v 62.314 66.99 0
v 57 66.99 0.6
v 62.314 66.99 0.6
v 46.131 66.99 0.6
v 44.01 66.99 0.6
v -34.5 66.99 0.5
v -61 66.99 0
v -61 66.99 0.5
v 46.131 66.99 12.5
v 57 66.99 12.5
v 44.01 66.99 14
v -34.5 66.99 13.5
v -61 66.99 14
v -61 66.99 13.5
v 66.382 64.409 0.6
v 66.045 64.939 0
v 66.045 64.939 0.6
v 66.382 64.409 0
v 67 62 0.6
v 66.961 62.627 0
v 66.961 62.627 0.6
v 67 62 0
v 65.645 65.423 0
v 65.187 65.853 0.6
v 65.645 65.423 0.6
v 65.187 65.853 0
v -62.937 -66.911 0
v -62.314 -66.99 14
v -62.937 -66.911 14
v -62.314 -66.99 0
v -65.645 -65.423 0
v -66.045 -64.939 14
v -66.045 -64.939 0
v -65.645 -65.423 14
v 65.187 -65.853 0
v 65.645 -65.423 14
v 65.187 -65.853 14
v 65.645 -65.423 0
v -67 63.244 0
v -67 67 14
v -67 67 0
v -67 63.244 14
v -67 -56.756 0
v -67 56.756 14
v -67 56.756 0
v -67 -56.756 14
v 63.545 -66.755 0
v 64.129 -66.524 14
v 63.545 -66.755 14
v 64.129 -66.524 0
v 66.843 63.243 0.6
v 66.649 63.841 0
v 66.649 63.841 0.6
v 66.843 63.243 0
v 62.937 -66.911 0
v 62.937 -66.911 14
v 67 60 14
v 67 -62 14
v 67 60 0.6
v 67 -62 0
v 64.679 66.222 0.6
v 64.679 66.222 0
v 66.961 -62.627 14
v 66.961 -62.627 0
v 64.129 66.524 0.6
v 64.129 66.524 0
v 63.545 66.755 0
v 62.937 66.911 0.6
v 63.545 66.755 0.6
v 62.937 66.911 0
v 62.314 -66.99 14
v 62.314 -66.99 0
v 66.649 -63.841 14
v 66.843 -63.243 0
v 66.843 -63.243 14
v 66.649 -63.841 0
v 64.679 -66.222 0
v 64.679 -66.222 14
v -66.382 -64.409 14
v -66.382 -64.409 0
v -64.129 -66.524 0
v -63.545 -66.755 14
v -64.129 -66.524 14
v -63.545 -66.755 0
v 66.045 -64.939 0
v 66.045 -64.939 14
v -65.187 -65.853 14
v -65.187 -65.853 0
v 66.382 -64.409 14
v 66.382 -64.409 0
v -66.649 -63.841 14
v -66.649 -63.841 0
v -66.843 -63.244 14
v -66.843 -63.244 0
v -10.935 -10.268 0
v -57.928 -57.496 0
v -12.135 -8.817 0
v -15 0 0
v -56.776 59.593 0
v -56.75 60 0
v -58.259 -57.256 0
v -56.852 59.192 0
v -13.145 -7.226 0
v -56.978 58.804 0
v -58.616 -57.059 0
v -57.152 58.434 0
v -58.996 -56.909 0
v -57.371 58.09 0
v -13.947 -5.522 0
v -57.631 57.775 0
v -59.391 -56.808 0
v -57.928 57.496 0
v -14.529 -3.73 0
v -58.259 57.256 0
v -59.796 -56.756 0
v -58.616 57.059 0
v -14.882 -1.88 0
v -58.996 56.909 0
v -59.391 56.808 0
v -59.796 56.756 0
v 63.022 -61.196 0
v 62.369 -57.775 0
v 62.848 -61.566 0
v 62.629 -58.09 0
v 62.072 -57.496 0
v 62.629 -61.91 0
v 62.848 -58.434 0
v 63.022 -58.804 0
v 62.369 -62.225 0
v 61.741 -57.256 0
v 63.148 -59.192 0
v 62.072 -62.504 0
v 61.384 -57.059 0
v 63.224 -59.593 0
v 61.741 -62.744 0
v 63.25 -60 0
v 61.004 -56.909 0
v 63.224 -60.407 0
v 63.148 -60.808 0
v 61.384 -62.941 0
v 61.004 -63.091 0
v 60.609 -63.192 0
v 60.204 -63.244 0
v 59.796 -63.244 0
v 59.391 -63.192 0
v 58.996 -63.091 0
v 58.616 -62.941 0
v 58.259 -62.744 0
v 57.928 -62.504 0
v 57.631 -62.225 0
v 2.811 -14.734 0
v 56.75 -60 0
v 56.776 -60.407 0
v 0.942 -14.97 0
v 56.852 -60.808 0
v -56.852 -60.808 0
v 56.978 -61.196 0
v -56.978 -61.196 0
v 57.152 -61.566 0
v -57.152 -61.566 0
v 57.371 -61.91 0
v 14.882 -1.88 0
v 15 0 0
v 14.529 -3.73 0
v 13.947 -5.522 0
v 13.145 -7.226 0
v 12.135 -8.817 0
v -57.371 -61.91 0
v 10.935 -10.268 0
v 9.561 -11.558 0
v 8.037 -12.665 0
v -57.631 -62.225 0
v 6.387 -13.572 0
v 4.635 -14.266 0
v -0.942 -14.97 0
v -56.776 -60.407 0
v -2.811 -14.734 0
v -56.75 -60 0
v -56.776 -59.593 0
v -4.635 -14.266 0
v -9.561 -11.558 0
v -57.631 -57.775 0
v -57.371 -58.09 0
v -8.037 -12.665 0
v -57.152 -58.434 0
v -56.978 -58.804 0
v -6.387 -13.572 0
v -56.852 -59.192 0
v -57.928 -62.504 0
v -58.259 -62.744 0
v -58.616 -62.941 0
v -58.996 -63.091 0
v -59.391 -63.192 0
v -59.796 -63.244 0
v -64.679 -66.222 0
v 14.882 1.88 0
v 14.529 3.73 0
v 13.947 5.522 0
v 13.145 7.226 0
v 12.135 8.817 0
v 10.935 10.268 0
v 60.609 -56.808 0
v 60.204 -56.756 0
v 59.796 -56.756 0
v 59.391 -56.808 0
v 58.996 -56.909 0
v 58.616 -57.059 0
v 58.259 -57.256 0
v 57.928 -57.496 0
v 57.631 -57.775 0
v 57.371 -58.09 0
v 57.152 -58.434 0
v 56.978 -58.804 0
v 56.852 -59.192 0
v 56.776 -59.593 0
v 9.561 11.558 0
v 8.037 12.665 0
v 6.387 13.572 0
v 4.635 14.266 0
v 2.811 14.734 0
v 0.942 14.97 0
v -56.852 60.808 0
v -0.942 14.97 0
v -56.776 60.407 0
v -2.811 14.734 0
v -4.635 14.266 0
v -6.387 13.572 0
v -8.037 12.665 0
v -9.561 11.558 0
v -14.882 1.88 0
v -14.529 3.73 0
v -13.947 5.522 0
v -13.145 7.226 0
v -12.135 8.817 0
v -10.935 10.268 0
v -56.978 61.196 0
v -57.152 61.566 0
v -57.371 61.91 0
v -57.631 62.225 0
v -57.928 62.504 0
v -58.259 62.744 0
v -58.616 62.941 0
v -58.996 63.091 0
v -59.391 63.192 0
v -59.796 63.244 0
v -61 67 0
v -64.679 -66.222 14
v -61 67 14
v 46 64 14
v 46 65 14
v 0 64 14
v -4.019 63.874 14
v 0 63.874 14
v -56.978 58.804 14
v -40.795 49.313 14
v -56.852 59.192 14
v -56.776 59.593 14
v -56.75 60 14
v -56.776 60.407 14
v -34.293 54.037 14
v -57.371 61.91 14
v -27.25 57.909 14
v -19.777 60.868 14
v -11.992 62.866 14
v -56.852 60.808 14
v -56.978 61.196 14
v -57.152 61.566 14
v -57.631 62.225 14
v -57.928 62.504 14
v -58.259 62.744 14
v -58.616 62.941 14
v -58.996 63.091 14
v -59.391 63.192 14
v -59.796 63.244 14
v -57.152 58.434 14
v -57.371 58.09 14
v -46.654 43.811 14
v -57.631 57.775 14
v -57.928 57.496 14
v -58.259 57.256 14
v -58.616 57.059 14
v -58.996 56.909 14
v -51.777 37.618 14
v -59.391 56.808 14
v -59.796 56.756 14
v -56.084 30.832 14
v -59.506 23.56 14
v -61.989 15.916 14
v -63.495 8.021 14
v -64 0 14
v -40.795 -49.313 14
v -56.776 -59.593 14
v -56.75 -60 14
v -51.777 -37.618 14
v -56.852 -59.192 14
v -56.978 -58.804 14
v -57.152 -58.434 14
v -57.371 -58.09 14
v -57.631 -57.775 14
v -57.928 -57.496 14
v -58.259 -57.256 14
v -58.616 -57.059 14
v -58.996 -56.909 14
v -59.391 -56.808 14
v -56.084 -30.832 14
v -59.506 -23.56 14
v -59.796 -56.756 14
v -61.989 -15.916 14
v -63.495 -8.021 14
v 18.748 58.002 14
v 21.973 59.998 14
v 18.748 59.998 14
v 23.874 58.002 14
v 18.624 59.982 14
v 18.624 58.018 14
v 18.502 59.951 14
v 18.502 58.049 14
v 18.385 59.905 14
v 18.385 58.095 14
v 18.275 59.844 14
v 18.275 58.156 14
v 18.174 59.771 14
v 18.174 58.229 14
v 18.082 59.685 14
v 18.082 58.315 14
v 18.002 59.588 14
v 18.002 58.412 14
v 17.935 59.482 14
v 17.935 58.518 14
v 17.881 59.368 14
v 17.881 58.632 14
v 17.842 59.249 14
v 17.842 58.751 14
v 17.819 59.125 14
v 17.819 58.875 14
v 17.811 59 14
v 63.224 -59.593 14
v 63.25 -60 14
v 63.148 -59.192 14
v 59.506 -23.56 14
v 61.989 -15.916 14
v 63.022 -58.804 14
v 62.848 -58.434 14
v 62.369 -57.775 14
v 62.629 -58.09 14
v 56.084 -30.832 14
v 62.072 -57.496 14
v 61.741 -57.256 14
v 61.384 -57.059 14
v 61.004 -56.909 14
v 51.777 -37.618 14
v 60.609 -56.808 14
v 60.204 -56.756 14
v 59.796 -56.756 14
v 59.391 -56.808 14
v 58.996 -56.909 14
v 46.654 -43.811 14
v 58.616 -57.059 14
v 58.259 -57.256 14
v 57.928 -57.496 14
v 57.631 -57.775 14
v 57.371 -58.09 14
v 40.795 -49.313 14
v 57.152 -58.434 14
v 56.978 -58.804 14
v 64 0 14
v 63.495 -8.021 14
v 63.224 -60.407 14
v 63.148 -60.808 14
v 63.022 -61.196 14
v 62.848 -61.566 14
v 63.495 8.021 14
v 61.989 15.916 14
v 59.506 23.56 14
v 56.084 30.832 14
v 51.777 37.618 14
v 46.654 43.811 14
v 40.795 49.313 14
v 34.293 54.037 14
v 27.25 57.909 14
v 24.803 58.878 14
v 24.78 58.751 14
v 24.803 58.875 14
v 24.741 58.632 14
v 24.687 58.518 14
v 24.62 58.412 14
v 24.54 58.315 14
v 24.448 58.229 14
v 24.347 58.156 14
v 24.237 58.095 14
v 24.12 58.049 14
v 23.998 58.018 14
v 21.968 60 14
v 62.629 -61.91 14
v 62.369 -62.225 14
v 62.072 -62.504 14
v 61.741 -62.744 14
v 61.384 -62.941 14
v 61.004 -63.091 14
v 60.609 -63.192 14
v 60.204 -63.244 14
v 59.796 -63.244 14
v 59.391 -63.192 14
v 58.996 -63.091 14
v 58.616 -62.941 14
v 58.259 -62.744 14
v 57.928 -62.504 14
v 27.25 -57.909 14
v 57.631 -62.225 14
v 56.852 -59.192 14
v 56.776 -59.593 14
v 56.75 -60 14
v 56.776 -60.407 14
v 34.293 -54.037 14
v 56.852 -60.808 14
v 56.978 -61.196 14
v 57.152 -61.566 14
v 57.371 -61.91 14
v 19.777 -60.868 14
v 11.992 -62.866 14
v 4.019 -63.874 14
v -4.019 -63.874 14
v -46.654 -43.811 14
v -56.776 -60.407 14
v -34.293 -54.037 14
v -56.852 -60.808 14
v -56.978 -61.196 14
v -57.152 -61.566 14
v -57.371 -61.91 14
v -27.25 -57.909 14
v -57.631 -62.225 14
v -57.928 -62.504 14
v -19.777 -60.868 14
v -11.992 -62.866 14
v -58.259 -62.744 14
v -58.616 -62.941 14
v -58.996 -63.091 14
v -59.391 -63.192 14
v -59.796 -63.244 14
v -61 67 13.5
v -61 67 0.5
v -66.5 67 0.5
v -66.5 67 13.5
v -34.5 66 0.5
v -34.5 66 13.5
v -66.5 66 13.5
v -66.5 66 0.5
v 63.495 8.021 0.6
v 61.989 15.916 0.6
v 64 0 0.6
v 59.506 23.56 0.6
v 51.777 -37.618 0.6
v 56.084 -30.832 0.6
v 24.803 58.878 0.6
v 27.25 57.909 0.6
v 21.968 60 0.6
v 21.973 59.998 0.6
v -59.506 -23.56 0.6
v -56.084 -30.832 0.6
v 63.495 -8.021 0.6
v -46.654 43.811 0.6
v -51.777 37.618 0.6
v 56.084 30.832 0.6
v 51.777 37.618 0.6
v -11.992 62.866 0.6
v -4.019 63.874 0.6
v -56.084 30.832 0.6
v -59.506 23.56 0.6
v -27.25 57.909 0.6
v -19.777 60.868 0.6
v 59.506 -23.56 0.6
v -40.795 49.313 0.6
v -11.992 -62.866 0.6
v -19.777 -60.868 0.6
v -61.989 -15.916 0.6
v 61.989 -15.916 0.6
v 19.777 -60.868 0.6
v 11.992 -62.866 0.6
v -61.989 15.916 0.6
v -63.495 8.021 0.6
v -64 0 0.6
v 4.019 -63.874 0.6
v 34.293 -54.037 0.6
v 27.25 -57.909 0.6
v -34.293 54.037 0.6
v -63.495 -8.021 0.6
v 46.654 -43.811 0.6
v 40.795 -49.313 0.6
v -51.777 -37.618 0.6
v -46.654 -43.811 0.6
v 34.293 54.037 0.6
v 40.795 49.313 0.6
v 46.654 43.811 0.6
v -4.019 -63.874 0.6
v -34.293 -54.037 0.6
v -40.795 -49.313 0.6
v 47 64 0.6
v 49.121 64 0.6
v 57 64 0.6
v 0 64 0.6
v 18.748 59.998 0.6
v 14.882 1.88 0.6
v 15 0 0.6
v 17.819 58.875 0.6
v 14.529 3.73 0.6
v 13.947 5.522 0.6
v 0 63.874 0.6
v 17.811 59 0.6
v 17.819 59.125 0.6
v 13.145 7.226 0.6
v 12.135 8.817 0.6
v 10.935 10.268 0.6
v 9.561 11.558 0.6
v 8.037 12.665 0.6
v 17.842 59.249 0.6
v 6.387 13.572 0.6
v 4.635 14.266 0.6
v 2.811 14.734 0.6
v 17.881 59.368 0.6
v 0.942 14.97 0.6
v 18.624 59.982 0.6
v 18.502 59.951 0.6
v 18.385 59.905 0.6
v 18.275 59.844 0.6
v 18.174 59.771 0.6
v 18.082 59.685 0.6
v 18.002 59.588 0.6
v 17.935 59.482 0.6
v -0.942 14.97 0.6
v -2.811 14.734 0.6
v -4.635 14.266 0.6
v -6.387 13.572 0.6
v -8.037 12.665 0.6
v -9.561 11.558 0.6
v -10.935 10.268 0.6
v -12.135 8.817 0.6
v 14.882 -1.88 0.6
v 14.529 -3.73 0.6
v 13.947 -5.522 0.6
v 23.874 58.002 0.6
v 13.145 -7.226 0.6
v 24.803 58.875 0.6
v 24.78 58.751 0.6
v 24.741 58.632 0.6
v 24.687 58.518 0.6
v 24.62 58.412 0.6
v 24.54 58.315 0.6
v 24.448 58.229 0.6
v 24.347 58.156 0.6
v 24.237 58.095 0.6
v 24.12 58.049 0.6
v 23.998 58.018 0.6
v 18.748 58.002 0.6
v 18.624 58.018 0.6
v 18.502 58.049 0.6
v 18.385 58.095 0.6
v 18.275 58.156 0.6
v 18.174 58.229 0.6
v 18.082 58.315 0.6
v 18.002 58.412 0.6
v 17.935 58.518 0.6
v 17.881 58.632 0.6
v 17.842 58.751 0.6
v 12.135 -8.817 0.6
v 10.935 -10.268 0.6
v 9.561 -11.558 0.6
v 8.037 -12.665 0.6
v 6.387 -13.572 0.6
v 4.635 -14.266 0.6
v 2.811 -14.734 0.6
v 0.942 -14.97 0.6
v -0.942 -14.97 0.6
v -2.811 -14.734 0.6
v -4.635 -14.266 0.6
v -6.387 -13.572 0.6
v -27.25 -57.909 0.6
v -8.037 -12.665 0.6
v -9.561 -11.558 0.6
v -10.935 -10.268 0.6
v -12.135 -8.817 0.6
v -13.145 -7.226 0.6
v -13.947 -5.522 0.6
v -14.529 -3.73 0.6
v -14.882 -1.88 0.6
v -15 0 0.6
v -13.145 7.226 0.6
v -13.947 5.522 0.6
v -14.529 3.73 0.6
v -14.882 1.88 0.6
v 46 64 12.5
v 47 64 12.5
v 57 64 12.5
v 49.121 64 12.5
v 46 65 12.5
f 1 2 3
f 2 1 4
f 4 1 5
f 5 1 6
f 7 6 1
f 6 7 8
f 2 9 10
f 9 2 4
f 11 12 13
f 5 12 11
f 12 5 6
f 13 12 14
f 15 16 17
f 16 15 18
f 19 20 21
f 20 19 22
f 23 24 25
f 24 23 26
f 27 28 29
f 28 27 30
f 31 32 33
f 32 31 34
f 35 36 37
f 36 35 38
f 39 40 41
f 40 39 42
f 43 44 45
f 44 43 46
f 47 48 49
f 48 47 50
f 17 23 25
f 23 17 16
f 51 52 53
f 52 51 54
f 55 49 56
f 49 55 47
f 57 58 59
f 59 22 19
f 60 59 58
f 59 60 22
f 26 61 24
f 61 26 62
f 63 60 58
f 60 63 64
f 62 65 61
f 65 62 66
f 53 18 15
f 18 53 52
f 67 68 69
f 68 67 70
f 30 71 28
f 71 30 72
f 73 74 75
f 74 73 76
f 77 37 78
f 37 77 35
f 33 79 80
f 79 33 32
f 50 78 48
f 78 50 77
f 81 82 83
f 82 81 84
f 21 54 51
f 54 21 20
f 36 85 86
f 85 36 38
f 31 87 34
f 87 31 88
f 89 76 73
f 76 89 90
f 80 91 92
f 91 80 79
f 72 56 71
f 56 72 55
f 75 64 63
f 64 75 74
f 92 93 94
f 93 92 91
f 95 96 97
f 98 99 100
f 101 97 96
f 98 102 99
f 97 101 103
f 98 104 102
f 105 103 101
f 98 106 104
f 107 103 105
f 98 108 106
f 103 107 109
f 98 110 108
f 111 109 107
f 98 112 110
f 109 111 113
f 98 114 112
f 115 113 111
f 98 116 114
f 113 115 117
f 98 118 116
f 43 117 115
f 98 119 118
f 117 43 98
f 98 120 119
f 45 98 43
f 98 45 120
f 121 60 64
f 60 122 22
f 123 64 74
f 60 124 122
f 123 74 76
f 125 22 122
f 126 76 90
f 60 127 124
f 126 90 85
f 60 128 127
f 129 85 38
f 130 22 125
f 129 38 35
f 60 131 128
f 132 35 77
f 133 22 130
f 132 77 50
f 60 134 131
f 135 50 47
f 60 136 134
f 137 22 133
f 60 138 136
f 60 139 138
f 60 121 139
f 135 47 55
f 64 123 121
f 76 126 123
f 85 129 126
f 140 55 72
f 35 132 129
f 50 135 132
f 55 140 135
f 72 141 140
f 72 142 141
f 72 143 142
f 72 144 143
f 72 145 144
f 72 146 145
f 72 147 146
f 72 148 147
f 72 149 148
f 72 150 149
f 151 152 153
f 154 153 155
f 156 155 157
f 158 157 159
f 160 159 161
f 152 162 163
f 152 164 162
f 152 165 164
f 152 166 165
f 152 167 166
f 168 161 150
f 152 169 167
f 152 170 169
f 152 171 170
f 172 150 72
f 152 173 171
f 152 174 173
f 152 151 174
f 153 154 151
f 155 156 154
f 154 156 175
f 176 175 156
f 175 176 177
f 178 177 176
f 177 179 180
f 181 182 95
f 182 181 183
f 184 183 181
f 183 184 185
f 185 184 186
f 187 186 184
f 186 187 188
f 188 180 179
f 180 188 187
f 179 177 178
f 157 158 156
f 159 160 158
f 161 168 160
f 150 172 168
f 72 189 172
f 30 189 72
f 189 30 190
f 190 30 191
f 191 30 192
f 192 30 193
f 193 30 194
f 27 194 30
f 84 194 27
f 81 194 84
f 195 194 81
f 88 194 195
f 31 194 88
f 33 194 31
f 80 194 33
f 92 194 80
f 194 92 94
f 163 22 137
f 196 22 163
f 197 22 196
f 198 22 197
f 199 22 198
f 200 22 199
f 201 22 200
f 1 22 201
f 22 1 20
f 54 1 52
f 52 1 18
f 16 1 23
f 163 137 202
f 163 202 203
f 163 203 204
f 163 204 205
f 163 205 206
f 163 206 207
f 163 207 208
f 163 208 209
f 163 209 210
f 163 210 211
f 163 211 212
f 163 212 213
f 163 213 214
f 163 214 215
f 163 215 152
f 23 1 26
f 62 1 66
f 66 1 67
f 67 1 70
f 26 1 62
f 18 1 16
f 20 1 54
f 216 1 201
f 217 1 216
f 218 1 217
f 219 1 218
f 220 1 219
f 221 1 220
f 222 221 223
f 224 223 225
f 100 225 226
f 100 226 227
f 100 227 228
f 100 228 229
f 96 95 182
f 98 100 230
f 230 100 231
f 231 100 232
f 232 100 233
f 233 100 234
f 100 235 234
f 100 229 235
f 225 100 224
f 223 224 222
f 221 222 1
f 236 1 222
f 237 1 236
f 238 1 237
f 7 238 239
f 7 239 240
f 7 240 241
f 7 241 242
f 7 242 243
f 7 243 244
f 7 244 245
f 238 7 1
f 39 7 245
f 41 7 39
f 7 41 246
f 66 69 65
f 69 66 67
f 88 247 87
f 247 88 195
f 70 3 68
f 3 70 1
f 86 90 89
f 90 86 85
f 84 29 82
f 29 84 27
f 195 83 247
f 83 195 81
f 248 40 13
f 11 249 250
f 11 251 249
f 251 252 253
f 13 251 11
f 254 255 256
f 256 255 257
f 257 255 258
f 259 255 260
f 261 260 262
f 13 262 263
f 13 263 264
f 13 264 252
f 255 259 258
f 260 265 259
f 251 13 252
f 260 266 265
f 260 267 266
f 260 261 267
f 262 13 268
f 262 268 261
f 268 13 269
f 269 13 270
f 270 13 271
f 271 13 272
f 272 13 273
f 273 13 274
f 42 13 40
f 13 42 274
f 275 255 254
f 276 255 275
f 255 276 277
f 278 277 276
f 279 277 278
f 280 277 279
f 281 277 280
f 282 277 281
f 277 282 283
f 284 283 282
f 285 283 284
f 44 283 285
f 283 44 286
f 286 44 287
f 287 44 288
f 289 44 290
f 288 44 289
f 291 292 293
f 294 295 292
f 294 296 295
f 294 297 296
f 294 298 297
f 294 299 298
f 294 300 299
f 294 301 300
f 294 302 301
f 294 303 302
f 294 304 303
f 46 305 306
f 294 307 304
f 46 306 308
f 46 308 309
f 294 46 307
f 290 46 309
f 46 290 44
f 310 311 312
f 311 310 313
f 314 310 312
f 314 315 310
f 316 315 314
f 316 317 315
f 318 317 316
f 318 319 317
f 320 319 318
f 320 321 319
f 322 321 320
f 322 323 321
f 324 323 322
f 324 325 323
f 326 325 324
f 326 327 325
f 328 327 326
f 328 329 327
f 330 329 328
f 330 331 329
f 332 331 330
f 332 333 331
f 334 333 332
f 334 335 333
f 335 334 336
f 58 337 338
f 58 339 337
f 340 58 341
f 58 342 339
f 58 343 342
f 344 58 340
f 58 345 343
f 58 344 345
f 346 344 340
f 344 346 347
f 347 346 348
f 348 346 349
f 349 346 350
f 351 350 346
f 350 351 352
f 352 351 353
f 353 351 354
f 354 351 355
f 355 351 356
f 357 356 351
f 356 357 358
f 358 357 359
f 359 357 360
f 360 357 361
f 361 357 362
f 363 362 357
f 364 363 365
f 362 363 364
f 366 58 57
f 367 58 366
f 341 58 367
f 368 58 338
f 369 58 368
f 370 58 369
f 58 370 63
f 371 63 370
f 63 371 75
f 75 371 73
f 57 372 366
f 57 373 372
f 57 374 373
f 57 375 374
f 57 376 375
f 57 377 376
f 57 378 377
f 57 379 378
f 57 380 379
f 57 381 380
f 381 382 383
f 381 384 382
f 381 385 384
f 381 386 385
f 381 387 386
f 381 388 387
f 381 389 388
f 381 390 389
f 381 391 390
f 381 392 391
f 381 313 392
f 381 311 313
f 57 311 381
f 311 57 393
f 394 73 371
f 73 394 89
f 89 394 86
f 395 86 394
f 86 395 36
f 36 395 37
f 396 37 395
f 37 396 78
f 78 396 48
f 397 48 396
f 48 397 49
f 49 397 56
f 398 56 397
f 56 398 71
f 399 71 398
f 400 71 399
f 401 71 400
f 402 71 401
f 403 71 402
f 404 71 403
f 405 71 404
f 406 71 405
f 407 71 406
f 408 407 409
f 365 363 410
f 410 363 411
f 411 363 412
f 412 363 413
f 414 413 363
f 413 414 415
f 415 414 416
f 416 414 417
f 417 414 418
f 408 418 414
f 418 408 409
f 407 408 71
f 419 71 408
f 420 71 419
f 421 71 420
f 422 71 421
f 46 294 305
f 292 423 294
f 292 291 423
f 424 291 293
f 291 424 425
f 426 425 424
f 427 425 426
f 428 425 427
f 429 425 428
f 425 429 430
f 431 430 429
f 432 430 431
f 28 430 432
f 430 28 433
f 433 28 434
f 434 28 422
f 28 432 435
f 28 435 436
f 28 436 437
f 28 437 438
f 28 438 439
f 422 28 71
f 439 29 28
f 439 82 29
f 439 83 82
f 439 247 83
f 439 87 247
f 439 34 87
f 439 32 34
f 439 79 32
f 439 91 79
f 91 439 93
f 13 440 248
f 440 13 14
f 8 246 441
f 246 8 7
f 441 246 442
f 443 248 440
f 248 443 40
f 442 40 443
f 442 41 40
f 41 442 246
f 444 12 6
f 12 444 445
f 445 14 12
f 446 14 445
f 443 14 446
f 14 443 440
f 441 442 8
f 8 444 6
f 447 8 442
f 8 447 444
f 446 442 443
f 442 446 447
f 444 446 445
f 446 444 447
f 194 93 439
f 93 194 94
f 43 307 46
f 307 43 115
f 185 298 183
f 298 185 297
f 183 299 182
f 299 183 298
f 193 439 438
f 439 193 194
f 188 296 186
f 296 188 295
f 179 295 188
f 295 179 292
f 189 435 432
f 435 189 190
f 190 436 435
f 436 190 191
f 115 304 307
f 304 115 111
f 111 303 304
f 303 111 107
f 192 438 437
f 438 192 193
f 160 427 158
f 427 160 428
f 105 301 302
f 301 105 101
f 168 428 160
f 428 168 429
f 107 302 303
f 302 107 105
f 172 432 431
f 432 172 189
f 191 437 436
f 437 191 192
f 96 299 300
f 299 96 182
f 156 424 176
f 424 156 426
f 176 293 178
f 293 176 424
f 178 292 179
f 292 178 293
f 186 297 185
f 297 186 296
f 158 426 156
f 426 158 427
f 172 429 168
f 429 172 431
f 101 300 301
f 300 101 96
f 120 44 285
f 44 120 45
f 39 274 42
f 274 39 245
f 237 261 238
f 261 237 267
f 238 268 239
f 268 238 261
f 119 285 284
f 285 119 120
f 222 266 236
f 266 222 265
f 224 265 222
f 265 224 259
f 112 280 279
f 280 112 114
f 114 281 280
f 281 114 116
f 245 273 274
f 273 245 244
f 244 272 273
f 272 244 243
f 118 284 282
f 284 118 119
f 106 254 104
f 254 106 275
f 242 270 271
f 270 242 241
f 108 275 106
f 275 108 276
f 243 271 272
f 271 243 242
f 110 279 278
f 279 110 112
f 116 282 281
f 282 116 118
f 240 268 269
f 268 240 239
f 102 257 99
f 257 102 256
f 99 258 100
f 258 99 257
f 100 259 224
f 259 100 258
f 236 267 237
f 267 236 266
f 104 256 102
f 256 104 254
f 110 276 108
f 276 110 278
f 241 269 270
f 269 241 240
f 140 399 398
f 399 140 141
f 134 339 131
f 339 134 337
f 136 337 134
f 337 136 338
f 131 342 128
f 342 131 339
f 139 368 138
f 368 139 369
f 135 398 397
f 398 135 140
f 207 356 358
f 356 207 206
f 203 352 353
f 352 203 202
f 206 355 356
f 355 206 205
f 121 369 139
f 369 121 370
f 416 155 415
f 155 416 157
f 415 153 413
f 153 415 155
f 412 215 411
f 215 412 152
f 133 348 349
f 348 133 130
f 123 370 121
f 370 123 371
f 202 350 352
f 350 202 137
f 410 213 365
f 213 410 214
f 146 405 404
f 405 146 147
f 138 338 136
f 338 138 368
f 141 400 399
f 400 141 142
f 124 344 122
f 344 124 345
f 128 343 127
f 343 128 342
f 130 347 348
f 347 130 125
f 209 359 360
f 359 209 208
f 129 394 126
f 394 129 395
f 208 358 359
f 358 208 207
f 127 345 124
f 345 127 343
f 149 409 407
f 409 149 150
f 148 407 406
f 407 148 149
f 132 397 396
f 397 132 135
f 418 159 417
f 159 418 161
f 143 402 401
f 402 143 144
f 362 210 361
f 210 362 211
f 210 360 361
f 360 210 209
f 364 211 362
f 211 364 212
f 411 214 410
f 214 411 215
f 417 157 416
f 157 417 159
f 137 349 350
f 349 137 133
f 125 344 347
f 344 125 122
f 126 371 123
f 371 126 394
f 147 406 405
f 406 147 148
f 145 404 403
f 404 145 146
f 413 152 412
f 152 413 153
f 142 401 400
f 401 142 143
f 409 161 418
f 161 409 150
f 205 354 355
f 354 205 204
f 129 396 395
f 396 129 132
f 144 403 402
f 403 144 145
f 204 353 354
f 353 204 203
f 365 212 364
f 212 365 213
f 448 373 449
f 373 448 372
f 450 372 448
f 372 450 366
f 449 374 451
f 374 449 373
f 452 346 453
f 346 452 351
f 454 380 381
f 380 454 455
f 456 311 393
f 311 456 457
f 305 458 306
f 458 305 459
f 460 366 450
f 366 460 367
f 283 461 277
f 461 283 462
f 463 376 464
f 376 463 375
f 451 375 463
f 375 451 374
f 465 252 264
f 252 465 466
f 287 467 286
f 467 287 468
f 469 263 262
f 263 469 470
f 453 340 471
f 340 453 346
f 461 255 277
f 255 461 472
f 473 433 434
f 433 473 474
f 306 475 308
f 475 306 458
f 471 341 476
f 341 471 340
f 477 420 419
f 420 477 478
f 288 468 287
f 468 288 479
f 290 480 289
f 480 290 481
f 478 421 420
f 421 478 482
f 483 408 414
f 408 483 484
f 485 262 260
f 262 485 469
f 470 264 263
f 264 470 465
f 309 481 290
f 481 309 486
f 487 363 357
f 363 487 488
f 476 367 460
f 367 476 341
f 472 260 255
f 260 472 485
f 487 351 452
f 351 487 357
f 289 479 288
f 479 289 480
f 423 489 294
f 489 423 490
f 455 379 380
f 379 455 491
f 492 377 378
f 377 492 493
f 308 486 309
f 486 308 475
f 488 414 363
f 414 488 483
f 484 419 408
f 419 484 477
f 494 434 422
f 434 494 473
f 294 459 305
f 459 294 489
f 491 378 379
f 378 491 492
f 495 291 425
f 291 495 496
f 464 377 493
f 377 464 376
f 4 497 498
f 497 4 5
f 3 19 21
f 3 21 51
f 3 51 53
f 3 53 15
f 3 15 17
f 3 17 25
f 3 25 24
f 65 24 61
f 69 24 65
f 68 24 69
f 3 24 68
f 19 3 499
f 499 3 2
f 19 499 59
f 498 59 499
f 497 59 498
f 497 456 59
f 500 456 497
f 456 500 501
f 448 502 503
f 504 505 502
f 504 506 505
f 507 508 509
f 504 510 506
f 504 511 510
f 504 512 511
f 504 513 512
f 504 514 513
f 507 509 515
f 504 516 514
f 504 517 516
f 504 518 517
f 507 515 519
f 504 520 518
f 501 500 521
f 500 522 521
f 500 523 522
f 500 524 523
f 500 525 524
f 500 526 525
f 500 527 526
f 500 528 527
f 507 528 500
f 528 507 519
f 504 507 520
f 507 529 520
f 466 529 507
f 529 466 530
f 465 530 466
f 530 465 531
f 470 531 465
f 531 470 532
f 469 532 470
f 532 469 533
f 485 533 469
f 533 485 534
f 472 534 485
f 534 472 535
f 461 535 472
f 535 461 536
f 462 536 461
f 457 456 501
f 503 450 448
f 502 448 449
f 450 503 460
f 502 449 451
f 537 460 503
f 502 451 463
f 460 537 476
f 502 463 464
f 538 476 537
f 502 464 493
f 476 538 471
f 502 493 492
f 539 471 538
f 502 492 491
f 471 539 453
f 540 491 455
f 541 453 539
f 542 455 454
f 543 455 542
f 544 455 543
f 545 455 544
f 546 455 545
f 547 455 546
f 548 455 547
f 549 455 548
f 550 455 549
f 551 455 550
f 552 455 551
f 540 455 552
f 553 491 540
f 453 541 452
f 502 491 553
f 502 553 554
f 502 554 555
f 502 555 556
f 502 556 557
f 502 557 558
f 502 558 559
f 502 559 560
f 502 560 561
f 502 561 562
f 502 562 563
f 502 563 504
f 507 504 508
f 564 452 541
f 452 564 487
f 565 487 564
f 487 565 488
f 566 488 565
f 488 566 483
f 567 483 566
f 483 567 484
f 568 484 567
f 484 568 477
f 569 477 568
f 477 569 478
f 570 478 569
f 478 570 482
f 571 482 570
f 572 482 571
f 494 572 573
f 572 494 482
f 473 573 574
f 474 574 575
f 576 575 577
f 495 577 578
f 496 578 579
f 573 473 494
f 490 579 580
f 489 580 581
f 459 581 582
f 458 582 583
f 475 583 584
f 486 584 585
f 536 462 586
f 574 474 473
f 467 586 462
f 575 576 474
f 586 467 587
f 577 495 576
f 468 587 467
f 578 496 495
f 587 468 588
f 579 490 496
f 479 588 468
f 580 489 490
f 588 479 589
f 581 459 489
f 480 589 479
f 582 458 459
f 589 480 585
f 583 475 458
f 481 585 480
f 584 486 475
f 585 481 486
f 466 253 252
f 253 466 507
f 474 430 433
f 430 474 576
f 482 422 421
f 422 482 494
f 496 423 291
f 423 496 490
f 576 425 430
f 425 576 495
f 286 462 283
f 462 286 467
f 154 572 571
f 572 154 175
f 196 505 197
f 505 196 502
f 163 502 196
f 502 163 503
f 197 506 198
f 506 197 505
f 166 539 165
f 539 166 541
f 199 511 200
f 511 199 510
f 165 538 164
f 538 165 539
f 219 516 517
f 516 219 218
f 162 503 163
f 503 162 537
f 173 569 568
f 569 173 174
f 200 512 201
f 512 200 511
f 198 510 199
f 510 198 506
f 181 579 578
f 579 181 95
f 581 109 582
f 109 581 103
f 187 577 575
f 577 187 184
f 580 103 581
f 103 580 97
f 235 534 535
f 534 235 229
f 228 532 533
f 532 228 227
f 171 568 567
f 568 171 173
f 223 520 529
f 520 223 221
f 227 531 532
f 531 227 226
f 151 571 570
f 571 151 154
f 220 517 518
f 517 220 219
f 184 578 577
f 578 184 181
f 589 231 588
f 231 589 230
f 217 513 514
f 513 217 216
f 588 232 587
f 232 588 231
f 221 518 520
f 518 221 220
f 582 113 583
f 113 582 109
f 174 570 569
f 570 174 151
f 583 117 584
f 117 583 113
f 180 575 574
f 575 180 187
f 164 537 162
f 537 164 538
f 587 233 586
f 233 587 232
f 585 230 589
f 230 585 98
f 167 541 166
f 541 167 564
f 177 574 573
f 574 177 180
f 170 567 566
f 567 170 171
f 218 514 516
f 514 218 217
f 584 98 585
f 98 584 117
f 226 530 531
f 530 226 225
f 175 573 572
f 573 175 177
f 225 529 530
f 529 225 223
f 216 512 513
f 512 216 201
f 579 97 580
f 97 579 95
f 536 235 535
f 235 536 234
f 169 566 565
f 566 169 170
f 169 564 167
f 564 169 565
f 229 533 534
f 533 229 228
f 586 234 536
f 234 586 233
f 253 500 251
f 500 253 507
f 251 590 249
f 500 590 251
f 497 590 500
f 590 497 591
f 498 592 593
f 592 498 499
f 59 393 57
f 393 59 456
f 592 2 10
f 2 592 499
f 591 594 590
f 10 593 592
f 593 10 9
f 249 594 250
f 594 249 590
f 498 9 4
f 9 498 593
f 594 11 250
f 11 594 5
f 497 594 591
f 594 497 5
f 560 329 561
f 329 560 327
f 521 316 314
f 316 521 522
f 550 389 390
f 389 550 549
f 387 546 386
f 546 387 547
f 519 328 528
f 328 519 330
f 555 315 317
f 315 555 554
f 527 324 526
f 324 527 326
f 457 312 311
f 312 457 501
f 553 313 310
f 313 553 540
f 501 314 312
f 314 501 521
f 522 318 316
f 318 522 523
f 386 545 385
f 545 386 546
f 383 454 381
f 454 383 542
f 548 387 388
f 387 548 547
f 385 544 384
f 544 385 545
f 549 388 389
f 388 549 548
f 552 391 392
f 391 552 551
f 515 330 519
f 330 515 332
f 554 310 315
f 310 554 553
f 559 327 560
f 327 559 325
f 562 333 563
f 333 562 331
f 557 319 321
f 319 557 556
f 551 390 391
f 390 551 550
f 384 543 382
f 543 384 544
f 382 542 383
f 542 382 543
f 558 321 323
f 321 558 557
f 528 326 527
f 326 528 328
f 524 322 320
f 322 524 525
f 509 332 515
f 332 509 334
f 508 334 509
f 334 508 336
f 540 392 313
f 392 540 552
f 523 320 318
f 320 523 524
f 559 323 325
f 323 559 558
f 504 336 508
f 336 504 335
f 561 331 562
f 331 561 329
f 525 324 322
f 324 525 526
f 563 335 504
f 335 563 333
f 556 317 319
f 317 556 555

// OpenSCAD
$fn = 50;


union() {
	difference() {
		union() {
			translate(v = [0, 0, 0]) {
				rotate(a = [0, 0, 0]) {
					hull() {
						translate(v = [-62.0000000000, 62.0000000000, 0]) {
							rotate(a = [0, 0, 0]) {
								translate(v = [0, 0, 0]) {
									rotate(a = [0, 0, 0]) {
										cylinder(h = 14, r = 5);
									}
								}
							}
						}
						translate(v = [62.0000000000, 62.0000000000, 0]) {
							rotate(a = [0, 0, 0]) {
								translate(v = [0, 0, 0]) {
									rotate(a = [0, 0, 0]) {
										cylinder(h = 14, r = 5);
									}
								}
							}
						}
						translate(v = [-62.0000000000, -62.0000000000, 0]) {
							rotate(a = [0, 0, 0]) {
								translate(v = [0, 0, 0]) {
									rotate(a = [0, 0, 0]) {
										cylinder(h = 14, r = 5);
									}
								}
							}
						}
						translate(v = [62.0000000000, -62.0000000000, 0]) {
							rotate(a = [0, 0, 0]) {
								translate(v = [0, 0, 0]) {
									rotate(a = [0, 0, 0]) {
										cylinder(h = 14, r = 5);
									}
								}
							}
						}
					}
				}
			}
			translate(v = [-67.0000000000, 61.0000000000, 0]) {
				rotate(a = [0, 0, 0]) {
					cube(size = [6, 6, 14]);
				}
			}
		}
		union() {
			#translate(v = [-66.5000000000, 66.0000000000, 0.5000000000]) {
				rotate(a = [0, 0, 0]) {
					cube(size = [32, 1, 13.0000000000]);
				}
			}
			translate(v = [-67.5000000000, -60.0000000000, -125]) {
				rotate(a = [0, 0, 0]) {
					hull() {
						translate(v = [7.5000000000, 0, 0]) {
							rotate(a = [0, 0, 0]) {
								translate(v = [0, 0, 0]) {
									rotate(a = [0, 0, 0]) {
										cylinder(h = 250, r = 3.2500000000);
									}
								}
							}
						}
						translate(v = [-7.5000000000, 0, 0]) {
							rotate(a = [0, 0, 0]) {
								translate(v = [0, 0, 0]) {
									rotate(a = [0, 0, 0]) {
										cylinder(h = 250, r = 3.2500000000);
									}
								}
							}
						}
					}
				}
			}
			translate(v = [-67.5000000000, 60.0000000000, -125]) {
				rotate(a = [0, 0, 0]) {
					hull() {
						translate(v = [7.5000000000, 0, 0]) {
							rotate(a = [0, 0, 0]) {
								translate(v = [0, 0, 0]) {
									rotate(a = [0, 0, 0]) {
										cylinder(h = 250, r = 3.2500000000);
									}
								}
							}
						}
						translate(v = [-7.5000000000, 0, 0]) {
							rotate(a = [0, 0, 0]) {
								translate(v = [0, 0, 0]) {
									rotate(a = [0, 0, 0]) {
										cylinder(h = 250, r = 3.2500000000);
									}
								}
							}
						}
					}
				}
			}
			translate(v = [60.0000000000, -60.0000000000, -125.0000000000]) {
				rotate(a = [0, 0, 0]) {
					cylinder(h = 250, r = 3.2500000000);
				}
			}
			translate(v = [0, 0, 0.6000000000]) {
				rotate(a = [0, 0, 0]) {
					cylinder(h = 16.4000000000, r = 64.0000000000);
				}
			}
			translate(v = [0, 0, -7.0000000000]) {
				rotate(a = [0, 0, 0]) {
					cylinder(h = 14, r = 15.0000000000);
				}
			}
			translate(v = [0.0000000000, 60.0000000000, 0.6000000000]) {
				rotate(a = [0, 0, 0]) {
					cube(size = [67.0000000000, 4, 16.4000000000]);
				}
			}
			translate(v = [57.0000000000, 60.0000000000, 0.6000000000]) {
				rotate(a = [0, 0, 0]) {
					cube(size = [10, 7, 16.4000000000]);
				}
			}
			translate(v = [46.0000000000, 60.0000000000, 12.5000000000]) {
				rotate(a = [0, 0, 0]) {
					cube(size = [21, 7, 1.5000000000]);
				}
			}
			translate(v = [43.2500000000, 67.7500000000, 0.6000000000]) {
				rotate(a = [0, 0, -45]) {
					cube(size = [7.5000000000, 1.5000000000, 16.4000000000]);
				}
			}
			translate(v = [12.0610000000, 58.0000000000, 0.6000000000]) {
				rotate(a = [0, 0, 0]) {
					cube(size = [7.5000000000, 2, 13.4000000000]);
				}
			}
		}
	}
	union() {
		translate(v = [21.3110000000, 59.0000000000, 0]) {
			rotate(a = [0, 0, 0]) {
				hull() {
					translate(v = [2.5000000000, 0, 0]) {
						rotate(a = [0, 0, 0]) {
							#translate(v = [0, 0, 0]) {
								rotate(a = [0, 0, 0]) {
									cylinder(h = 14, r = 1.0000000000);
								}
							}
						}
					}
					translate(v = [-2.5000000000, 0, 0]) {
						rotate(a = [0, 0, 0]) {
							#translate(v = [0, 0, 0]) {
								rotate(a = [0, 0, 0]) {
									cylinder(h = 14, r = 1.0000000000);
								}
							}
						}
					}
				}
			}
		}
	}
}
